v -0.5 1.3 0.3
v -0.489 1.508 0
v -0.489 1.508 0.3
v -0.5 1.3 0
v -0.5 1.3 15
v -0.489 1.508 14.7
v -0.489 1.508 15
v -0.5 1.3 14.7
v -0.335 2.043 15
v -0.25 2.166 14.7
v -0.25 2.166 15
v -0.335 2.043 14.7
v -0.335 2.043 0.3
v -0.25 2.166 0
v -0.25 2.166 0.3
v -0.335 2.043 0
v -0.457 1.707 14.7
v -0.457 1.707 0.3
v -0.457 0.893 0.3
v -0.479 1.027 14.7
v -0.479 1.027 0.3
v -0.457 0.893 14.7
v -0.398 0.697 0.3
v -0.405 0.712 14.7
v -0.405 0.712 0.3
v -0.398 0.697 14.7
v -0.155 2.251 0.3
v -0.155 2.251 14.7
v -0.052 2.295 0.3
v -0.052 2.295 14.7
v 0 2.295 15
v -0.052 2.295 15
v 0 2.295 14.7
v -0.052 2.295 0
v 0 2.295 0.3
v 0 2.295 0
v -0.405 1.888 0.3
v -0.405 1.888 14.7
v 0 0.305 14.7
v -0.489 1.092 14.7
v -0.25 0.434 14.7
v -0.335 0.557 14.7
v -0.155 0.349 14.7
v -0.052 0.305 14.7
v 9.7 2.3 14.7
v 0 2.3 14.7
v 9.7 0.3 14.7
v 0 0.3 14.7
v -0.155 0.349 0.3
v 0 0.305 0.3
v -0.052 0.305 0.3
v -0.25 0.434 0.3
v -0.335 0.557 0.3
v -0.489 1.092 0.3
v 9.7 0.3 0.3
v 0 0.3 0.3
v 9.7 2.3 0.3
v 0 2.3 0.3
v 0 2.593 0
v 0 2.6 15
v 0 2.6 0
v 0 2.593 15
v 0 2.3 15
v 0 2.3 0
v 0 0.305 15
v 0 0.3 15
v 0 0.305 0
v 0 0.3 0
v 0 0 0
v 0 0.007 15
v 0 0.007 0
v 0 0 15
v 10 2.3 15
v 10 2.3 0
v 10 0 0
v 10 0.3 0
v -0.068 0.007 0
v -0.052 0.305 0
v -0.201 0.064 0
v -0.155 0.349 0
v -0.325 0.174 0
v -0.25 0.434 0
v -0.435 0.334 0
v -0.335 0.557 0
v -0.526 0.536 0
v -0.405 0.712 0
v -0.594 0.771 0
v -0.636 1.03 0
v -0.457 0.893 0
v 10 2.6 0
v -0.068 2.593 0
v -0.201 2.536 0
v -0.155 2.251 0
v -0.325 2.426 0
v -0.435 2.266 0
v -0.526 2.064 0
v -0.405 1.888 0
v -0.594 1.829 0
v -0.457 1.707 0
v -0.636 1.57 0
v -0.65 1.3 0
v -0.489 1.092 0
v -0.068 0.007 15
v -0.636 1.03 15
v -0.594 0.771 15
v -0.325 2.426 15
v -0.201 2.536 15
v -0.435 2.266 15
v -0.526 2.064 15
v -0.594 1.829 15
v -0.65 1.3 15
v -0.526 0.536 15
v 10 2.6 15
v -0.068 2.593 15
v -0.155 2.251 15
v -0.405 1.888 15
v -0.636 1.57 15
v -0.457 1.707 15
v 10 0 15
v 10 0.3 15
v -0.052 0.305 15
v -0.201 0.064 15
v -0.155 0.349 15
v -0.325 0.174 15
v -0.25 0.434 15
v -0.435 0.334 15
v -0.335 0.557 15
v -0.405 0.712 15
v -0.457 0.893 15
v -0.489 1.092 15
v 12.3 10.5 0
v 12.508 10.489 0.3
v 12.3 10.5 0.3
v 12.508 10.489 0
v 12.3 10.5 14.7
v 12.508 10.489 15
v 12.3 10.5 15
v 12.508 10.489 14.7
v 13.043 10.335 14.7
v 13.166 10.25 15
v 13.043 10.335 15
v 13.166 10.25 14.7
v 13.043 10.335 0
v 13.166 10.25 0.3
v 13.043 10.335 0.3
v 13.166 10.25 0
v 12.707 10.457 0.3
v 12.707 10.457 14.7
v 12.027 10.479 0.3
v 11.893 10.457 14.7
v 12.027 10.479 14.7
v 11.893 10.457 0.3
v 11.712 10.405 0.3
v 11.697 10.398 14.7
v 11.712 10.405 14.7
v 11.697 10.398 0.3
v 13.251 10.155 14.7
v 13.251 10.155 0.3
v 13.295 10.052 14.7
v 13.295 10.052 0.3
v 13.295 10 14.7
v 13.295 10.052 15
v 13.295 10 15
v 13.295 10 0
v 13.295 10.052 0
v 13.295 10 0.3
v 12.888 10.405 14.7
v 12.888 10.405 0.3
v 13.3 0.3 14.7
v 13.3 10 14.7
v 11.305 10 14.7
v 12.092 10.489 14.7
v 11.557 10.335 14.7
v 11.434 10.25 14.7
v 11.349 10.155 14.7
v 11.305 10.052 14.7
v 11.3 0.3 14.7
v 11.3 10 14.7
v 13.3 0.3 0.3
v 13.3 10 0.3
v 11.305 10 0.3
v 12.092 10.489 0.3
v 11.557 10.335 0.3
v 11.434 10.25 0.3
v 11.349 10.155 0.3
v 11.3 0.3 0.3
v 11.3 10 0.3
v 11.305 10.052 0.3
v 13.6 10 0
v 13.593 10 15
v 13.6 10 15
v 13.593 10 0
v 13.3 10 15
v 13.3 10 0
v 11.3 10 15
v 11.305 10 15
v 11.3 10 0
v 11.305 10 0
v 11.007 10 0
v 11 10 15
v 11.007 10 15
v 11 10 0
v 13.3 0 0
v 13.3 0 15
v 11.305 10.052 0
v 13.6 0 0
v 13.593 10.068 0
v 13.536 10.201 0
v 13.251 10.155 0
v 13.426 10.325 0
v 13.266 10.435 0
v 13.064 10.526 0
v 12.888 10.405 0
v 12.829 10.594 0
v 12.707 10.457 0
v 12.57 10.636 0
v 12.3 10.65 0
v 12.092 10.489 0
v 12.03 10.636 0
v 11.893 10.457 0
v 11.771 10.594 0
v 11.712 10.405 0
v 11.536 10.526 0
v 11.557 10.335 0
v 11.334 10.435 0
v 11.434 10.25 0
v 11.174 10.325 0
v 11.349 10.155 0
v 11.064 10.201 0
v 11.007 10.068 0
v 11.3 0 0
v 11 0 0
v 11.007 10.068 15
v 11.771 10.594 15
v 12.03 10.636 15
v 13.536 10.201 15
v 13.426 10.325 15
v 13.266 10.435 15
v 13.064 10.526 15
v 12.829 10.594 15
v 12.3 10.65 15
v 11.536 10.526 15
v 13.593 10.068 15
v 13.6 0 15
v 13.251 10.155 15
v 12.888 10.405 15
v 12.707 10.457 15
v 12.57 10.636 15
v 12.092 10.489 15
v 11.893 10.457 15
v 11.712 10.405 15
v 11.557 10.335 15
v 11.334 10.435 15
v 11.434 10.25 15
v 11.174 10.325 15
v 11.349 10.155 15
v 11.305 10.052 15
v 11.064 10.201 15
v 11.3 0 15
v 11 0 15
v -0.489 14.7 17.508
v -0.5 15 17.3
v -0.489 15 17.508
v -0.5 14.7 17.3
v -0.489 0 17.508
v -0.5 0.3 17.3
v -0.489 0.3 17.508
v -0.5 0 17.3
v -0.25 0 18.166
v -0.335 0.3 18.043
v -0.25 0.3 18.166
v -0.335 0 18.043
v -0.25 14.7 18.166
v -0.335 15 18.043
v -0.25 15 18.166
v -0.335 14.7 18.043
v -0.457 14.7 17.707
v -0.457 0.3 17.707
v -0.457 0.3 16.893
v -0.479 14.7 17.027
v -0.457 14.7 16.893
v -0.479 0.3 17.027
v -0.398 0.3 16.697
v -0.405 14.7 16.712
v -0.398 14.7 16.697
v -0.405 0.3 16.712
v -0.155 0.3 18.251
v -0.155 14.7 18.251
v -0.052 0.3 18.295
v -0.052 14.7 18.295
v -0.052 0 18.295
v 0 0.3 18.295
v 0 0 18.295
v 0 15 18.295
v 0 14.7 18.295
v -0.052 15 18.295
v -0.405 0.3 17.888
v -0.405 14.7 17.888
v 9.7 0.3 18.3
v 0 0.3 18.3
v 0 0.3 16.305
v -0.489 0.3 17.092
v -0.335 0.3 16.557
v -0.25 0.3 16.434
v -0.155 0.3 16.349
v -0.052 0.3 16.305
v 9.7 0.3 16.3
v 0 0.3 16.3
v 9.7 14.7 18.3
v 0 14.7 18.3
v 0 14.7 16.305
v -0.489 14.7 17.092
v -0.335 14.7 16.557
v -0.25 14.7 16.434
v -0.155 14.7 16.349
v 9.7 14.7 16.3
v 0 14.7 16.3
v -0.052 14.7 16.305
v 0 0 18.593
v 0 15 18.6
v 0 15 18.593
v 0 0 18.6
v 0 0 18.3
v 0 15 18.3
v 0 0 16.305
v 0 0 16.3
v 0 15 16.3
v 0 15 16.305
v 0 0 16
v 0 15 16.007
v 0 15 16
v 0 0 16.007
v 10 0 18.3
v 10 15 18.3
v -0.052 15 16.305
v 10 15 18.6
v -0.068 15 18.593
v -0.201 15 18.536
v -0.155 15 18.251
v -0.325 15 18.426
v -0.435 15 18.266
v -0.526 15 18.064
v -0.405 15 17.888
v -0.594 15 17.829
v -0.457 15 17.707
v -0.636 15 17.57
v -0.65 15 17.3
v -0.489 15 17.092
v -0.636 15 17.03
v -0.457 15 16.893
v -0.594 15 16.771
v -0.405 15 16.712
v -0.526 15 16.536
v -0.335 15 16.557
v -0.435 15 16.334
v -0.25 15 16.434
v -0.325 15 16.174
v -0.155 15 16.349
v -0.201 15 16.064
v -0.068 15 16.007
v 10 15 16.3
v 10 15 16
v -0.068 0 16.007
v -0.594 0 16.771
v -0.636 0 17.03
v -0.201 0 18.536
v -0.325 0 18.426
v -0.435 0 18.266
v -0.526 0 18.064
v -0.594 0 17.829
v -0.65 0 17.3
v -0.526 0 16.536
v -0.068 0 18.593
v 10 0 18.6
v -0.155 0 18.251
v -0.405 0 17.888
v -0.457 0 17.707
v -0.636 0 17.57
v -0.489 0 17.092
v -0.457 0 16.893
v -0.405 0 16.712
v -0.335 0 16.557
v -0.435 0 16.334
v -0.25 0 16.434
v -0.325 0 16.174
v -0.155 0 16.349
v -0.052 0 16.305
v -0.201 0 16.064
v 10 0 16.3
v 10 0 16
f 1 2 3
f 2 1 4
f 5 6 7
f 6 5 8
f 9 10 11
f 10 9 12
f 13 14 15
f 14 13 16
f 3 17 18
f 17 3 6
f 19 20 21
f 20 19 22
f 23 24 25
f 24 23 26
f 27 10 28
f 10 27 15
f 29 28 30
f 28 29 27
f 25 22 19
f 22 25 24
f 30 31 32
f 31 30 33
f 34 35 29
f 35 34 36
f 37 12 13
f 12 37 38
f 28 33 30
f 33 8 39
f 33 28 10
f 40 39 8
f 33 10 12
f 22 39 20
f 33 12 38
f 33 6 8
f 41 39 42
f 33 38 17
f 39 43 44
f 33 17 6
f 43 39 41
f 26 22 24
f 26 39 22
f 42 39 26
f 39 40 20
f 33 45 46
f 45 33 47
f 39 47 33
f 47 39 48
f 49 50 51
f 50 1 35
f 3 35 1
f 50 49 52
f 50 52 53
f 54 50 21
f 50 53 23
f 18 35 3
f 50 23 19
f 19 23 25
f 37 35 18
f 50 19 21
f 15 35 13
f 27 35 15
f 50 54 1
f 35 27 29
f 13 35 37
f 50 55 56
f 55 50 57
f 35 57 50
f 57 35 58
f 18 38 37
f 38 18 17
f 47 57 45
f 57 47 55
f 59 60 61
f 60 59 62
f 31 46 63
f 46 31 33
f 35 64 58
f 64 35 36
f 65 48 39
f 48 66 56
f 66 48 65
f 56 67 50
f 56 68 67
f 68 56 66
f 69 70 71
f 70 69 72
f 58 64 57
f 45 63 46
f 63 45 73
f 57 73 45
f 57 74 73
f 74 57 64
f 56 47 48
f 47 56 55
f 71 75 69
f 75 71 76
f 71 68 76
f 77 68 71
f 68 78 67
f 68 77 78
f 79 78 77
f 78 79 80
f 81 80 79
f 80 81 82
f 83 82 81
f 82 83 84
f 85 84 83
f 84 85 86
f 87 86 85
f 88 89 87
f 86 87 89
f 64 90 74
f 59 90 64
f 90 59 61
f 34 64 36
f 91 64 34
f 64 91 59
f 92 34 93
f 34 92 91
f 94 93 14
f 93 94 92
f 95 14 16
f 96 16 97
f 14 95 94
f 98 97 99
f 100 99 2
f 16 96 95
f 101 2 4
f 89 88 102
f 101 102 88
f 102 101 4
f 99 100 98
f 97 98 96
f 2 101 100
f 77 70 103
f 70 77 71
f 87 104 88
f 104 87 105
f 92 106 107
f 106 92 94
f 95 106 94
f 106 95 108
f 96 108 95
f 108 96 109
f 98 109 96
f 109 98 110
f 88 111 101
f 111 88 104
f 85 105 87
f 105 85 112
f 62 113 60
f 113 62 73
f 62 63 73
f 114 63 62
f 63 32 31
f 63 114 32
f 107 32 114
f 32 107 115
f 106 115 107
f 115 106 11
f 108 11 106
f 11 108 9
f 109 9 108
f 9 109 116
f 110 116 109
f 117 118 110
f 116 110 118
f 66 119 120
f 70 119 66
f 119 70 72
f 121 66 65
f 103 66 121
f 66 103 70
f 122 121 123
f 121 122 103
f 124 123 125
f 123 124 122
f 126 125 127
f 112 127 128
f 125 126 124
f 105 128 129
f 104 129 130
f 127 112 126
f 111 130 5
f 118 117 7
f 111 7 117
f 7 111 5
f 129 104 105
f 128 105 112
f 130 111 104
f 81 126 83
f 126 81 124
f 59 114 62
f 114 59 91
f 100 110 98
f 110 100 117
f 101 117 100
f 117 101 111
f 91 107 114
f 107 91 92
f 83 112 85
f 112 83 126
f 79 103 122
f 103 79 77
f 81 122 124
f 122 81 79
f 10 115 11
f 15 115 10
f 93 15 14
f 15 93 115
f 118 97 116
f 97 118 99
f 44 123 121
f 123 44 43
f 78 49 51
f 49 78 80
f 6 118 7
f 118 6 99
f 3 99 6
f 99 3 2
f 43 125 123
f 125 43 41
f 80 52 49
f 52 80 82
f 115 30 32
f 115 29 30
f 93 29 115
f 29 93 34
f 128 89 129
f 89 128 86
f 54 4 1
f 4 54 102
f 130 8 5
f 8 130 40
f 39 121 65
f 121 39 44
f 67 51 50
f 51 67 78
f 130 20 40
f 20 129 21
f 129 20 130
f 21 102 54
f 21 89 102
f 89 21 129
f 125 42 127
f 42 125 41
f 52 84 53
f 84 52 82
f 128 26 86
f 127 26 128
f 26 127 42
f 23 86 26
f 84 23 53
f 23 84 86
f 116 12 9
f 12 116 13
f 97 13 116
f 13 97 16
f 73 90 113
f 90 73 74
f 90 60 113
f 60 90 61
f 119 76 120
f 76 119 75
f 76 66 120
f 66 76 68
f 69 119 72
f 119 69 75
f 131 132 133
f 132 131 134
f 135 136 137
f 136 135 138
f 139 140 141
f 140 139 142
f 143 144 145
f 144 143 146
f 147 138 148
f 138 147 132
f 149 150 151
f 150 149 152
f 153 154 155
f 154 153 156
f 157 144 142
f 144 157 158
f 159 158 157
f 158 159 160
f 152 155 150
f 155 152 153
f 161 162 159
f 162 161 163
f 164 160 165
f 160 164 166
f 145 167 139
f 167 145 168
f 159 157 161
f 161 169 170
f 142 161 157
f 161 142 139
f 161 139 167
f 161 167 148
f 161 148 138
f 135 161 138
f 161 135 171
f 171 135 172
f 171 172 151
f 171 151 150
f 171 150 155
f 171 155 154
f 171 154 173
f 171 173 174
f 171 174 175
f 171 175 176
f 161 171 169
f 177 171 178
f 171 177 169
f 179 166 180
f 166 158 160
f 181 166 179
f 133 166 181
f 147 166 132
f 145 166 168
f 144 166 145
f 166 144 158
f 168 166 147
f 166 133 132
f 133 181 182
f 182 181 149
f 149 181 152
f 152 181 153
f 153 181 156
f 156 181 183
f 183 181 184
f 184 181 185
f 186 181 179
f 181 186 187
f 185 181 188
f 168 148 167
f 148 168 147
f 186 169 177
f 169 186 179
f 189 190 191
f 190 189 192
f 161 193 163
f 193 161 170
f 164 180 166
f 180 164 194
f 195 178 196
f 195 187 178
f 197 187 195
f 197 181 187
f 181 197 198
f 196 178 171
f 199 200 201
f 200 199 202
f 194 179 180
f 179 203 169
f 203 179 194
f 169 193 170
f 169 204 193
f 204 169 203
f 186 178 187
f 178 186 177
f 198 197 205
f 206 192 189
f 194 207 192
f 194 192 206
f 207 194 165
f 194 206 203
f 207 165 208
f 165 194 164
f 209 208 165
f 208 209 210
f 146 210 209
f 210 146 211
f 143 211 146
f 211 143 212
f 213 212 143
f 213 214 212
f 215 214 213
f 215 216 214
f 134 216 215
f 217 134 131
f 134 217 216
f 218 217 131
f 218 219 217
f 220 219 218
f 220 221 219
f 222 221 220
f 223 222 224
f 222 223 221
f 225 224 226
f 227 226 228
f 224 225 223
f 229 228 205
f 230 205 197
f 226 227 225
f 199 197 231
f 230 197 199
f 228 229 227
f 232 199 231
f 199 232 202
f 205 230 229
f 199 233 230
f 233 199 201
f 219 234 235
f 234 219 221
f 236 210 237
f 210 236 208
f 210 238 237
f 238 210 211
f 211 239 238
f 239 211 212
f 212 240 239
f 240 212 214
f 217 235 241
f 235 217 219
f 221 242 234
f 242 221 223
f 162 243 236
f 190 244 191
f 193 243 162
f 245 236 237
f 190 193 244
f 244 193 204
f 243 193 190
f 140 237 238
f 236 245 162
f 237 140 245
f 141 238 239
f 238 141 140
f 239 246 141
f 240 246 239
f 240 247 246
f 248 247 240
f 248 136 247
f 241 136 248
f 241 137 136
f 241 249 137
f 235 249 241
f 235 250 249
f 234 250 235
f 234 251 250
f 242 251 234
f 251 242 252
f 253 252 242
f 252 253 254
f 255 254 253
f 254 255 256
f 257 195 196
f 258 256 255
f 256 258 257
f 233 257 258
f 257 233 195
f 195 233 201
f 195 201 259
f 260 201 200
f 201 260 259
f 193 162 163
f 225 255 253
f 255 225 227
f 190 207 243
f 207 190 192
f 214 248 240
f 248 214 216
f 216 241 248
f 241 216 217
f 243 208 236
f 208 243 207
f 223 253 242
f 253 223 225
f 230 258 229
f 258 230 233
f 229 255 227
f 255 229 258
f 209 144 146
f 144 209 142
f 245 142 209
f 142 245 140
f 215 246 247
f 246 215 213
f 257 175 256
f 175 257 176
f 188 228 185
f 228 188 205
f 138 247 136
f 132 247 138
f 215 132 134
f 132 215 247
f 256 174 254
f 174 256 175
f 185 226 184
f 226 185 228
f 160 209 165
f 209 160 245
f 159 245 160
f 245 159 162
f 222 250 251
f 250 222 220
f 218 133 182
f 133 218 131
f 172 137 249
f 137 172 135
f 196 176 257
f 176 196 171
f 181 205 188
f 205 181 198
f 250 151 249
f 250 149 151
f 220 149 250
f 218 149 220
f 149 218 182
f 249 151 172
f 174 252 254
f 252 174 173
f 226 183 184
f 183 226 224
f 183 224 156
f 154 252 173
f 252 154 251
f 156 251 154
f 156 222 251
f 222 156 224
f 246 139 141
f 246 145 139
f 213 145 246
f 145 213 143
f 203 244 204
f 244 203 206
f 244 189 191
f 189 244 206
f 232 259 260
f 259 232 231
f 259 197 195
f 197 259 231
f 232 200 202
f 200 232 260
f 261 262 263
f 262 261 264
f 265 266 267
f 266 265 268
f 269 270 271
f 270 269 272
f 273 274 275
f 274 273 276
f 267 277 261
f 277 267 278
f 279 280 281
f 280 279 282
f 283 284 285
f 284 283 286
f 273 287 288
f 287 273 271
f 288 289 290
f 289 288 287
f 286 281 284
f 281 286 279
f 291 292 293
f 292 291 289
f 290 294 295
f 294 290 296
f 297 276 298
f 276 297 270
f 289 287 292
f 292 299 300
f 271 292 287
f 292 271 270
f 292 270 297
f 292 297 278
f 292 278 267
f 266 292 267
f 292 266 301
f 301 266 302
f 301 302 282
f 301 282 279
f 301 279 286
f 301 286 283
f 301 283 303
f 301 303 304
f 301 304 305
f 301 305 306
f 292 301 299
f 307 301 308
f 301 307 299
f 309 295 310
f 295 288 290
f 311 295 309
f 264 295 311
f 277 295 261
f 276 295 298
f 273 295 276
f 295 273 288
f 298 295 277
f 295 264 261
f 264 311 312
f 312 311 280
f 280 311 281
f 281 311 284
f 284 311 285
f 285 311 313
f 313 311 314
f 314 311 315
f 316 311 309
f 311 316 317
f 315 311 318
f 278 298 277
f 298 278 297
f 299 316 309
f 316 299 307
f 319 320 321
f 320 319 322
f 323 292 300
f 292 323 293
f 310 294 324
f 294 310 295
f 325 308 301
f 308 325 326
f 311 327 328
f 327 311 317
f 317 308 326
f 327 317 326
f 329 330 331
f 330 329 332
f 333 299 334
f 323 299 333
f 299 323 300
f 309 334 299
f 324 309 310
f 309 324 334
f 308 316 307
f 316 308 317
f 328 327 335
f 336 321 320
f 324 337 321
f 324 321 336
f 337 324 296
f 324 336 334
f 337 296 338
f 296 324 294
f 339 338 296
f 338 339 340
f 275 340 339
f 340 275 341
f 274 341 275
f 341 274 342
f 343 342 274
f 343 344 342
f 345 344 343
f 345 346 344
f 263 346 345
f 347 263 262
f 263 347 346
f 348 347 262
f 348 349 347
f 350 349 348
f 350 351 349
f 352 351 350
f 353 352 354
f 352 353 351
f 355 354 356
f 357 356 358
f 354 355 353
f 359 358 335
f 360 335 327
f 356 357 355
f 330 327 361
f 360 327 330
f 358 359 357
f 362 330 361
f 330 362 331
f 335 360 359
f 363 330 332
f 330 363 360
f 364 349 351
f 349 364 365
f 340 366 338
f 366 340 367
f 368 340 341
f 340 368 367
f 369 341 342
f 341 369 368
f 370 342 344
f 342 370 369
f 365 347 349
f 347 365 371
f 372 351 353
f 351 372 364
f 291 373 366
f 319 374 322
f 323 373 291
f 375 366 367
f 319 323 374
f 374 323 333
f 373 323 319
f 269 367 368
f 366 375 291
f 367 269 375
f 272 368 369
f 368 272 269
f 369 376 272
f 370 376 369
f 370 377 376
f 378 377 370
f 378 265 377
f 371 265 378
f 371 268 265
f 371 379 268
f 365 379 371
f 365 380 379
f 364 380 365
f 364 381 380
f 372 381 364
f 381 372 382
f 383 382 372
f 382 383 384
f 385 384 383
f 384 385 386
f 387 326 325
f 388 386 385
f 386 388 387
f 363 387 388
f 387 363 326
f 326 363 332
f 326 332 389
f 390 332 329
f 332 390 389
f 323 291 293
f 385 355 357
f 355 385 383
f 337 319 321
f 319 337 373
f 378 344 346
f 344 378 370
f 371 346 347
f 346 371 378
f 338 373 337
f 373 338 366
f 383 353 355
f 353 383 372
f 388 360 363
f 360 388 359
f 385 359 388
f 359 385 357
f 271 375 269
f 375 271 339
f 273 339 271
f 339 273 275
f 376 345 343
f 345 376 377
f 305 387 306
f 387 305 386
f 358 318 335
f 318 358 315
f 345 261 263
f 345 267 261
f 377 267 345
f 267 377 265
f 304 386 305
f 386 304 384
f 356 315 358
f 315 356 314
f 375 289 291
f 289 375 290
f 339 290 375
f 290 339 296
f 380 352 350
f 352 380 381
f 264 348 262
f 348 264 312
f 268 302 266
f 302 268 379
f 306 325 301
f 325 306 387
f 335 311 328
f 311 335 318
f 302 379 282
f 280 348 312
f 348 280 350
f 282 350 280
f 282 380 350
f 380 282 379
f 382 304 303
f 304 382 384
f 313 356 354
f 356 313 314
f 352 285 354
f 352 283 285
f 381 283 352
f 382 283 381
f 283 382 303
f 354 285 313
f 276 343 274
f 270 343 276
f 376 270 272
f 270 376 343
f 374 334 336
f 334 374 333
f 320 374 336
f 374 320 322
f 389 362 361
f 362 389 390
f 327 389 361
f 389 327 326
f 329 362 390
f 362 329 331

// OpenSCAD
// Example third-angle
//cmdline: --projection=o --imgsize=400,400

use <../common/labeling.scad>

$vpt=[ 6.15, 1.76, 9.38 ];
$vpr=[ 90.00, 0.00, 0.00 ];
$vpd=50.44;
$vpf=22.50;

$fs=0.1;

coverWidth=10;
coverHeight=15;
coverThickness=0.3;

pagesInset=0.3;
pagesHeight=coverHeight - pagesInset*2;
pagesWidth=coverWidth - pagesInset;
pagesThickness=2;

bookThickness=coverThickness*2 + pagesThickness;

module coverColor() {
    color("#0000dd") children();
}

module textColor() {
    color("#66aa66") children();
}

module pagesColor() {
    color("#ffffee") children();
}

module cover() {
    coverColor() cube([coverWidth,coverThickness,coverHeight]);
}

module pages() {
    pagesColor() union() {
        translate([0,pagesThickness/2]) scale([0.5,1,1]) cylinder(h=pagesHeight, r=pagesThickness/2);
        cube([pagesWidth, pagesThickness, pagesHeight]);
    }
}

module spine() {
    coverColor() scale([0.5,1,1]) difference() {
        cylinder(h=coverHeight, r=bookThickness/2);
        translate([0,0,-0.01]) cylinder(h=coverHeight+0.02, r=pagesThickness/2);
        translate([0, -(bookThickness/2 + 0.1), -0.1]) cube([bookThickness + 0.2, bookThickness + 0.2, coverHeight+0.2]);
    }
}

module book() {
    cover();
    translate([0,coverThickness]) {
        translate([0, 0, pagesInset]) pages();
        translate([0, pagesThickness/2]) spine();
        translate([0,pagesThickness]) cover();
    }

    textColor() {
        translate([coverWidth/2, 0.4, coverHeight/2]) rotate([90, 0, 0]) text("front", size=2, halign="center");
        translate([coverWidth/2, bookThickness/2, coverHeight-0.6]) text("top", size=1, halign="center", valign="center");
        translate([coverWidth-0.6, bookThickness/2, coverHeight/2]) rotate([0, 90, 0]) text("right", size=1, halign="center", valign="center");
    }
}

thirdAngle([coverWidth, bookThickness, coverHeight], frontLabels=[0,0,0]) {
    book();
    
    union() {}
    
    union() {}
    
    union() {}
}
